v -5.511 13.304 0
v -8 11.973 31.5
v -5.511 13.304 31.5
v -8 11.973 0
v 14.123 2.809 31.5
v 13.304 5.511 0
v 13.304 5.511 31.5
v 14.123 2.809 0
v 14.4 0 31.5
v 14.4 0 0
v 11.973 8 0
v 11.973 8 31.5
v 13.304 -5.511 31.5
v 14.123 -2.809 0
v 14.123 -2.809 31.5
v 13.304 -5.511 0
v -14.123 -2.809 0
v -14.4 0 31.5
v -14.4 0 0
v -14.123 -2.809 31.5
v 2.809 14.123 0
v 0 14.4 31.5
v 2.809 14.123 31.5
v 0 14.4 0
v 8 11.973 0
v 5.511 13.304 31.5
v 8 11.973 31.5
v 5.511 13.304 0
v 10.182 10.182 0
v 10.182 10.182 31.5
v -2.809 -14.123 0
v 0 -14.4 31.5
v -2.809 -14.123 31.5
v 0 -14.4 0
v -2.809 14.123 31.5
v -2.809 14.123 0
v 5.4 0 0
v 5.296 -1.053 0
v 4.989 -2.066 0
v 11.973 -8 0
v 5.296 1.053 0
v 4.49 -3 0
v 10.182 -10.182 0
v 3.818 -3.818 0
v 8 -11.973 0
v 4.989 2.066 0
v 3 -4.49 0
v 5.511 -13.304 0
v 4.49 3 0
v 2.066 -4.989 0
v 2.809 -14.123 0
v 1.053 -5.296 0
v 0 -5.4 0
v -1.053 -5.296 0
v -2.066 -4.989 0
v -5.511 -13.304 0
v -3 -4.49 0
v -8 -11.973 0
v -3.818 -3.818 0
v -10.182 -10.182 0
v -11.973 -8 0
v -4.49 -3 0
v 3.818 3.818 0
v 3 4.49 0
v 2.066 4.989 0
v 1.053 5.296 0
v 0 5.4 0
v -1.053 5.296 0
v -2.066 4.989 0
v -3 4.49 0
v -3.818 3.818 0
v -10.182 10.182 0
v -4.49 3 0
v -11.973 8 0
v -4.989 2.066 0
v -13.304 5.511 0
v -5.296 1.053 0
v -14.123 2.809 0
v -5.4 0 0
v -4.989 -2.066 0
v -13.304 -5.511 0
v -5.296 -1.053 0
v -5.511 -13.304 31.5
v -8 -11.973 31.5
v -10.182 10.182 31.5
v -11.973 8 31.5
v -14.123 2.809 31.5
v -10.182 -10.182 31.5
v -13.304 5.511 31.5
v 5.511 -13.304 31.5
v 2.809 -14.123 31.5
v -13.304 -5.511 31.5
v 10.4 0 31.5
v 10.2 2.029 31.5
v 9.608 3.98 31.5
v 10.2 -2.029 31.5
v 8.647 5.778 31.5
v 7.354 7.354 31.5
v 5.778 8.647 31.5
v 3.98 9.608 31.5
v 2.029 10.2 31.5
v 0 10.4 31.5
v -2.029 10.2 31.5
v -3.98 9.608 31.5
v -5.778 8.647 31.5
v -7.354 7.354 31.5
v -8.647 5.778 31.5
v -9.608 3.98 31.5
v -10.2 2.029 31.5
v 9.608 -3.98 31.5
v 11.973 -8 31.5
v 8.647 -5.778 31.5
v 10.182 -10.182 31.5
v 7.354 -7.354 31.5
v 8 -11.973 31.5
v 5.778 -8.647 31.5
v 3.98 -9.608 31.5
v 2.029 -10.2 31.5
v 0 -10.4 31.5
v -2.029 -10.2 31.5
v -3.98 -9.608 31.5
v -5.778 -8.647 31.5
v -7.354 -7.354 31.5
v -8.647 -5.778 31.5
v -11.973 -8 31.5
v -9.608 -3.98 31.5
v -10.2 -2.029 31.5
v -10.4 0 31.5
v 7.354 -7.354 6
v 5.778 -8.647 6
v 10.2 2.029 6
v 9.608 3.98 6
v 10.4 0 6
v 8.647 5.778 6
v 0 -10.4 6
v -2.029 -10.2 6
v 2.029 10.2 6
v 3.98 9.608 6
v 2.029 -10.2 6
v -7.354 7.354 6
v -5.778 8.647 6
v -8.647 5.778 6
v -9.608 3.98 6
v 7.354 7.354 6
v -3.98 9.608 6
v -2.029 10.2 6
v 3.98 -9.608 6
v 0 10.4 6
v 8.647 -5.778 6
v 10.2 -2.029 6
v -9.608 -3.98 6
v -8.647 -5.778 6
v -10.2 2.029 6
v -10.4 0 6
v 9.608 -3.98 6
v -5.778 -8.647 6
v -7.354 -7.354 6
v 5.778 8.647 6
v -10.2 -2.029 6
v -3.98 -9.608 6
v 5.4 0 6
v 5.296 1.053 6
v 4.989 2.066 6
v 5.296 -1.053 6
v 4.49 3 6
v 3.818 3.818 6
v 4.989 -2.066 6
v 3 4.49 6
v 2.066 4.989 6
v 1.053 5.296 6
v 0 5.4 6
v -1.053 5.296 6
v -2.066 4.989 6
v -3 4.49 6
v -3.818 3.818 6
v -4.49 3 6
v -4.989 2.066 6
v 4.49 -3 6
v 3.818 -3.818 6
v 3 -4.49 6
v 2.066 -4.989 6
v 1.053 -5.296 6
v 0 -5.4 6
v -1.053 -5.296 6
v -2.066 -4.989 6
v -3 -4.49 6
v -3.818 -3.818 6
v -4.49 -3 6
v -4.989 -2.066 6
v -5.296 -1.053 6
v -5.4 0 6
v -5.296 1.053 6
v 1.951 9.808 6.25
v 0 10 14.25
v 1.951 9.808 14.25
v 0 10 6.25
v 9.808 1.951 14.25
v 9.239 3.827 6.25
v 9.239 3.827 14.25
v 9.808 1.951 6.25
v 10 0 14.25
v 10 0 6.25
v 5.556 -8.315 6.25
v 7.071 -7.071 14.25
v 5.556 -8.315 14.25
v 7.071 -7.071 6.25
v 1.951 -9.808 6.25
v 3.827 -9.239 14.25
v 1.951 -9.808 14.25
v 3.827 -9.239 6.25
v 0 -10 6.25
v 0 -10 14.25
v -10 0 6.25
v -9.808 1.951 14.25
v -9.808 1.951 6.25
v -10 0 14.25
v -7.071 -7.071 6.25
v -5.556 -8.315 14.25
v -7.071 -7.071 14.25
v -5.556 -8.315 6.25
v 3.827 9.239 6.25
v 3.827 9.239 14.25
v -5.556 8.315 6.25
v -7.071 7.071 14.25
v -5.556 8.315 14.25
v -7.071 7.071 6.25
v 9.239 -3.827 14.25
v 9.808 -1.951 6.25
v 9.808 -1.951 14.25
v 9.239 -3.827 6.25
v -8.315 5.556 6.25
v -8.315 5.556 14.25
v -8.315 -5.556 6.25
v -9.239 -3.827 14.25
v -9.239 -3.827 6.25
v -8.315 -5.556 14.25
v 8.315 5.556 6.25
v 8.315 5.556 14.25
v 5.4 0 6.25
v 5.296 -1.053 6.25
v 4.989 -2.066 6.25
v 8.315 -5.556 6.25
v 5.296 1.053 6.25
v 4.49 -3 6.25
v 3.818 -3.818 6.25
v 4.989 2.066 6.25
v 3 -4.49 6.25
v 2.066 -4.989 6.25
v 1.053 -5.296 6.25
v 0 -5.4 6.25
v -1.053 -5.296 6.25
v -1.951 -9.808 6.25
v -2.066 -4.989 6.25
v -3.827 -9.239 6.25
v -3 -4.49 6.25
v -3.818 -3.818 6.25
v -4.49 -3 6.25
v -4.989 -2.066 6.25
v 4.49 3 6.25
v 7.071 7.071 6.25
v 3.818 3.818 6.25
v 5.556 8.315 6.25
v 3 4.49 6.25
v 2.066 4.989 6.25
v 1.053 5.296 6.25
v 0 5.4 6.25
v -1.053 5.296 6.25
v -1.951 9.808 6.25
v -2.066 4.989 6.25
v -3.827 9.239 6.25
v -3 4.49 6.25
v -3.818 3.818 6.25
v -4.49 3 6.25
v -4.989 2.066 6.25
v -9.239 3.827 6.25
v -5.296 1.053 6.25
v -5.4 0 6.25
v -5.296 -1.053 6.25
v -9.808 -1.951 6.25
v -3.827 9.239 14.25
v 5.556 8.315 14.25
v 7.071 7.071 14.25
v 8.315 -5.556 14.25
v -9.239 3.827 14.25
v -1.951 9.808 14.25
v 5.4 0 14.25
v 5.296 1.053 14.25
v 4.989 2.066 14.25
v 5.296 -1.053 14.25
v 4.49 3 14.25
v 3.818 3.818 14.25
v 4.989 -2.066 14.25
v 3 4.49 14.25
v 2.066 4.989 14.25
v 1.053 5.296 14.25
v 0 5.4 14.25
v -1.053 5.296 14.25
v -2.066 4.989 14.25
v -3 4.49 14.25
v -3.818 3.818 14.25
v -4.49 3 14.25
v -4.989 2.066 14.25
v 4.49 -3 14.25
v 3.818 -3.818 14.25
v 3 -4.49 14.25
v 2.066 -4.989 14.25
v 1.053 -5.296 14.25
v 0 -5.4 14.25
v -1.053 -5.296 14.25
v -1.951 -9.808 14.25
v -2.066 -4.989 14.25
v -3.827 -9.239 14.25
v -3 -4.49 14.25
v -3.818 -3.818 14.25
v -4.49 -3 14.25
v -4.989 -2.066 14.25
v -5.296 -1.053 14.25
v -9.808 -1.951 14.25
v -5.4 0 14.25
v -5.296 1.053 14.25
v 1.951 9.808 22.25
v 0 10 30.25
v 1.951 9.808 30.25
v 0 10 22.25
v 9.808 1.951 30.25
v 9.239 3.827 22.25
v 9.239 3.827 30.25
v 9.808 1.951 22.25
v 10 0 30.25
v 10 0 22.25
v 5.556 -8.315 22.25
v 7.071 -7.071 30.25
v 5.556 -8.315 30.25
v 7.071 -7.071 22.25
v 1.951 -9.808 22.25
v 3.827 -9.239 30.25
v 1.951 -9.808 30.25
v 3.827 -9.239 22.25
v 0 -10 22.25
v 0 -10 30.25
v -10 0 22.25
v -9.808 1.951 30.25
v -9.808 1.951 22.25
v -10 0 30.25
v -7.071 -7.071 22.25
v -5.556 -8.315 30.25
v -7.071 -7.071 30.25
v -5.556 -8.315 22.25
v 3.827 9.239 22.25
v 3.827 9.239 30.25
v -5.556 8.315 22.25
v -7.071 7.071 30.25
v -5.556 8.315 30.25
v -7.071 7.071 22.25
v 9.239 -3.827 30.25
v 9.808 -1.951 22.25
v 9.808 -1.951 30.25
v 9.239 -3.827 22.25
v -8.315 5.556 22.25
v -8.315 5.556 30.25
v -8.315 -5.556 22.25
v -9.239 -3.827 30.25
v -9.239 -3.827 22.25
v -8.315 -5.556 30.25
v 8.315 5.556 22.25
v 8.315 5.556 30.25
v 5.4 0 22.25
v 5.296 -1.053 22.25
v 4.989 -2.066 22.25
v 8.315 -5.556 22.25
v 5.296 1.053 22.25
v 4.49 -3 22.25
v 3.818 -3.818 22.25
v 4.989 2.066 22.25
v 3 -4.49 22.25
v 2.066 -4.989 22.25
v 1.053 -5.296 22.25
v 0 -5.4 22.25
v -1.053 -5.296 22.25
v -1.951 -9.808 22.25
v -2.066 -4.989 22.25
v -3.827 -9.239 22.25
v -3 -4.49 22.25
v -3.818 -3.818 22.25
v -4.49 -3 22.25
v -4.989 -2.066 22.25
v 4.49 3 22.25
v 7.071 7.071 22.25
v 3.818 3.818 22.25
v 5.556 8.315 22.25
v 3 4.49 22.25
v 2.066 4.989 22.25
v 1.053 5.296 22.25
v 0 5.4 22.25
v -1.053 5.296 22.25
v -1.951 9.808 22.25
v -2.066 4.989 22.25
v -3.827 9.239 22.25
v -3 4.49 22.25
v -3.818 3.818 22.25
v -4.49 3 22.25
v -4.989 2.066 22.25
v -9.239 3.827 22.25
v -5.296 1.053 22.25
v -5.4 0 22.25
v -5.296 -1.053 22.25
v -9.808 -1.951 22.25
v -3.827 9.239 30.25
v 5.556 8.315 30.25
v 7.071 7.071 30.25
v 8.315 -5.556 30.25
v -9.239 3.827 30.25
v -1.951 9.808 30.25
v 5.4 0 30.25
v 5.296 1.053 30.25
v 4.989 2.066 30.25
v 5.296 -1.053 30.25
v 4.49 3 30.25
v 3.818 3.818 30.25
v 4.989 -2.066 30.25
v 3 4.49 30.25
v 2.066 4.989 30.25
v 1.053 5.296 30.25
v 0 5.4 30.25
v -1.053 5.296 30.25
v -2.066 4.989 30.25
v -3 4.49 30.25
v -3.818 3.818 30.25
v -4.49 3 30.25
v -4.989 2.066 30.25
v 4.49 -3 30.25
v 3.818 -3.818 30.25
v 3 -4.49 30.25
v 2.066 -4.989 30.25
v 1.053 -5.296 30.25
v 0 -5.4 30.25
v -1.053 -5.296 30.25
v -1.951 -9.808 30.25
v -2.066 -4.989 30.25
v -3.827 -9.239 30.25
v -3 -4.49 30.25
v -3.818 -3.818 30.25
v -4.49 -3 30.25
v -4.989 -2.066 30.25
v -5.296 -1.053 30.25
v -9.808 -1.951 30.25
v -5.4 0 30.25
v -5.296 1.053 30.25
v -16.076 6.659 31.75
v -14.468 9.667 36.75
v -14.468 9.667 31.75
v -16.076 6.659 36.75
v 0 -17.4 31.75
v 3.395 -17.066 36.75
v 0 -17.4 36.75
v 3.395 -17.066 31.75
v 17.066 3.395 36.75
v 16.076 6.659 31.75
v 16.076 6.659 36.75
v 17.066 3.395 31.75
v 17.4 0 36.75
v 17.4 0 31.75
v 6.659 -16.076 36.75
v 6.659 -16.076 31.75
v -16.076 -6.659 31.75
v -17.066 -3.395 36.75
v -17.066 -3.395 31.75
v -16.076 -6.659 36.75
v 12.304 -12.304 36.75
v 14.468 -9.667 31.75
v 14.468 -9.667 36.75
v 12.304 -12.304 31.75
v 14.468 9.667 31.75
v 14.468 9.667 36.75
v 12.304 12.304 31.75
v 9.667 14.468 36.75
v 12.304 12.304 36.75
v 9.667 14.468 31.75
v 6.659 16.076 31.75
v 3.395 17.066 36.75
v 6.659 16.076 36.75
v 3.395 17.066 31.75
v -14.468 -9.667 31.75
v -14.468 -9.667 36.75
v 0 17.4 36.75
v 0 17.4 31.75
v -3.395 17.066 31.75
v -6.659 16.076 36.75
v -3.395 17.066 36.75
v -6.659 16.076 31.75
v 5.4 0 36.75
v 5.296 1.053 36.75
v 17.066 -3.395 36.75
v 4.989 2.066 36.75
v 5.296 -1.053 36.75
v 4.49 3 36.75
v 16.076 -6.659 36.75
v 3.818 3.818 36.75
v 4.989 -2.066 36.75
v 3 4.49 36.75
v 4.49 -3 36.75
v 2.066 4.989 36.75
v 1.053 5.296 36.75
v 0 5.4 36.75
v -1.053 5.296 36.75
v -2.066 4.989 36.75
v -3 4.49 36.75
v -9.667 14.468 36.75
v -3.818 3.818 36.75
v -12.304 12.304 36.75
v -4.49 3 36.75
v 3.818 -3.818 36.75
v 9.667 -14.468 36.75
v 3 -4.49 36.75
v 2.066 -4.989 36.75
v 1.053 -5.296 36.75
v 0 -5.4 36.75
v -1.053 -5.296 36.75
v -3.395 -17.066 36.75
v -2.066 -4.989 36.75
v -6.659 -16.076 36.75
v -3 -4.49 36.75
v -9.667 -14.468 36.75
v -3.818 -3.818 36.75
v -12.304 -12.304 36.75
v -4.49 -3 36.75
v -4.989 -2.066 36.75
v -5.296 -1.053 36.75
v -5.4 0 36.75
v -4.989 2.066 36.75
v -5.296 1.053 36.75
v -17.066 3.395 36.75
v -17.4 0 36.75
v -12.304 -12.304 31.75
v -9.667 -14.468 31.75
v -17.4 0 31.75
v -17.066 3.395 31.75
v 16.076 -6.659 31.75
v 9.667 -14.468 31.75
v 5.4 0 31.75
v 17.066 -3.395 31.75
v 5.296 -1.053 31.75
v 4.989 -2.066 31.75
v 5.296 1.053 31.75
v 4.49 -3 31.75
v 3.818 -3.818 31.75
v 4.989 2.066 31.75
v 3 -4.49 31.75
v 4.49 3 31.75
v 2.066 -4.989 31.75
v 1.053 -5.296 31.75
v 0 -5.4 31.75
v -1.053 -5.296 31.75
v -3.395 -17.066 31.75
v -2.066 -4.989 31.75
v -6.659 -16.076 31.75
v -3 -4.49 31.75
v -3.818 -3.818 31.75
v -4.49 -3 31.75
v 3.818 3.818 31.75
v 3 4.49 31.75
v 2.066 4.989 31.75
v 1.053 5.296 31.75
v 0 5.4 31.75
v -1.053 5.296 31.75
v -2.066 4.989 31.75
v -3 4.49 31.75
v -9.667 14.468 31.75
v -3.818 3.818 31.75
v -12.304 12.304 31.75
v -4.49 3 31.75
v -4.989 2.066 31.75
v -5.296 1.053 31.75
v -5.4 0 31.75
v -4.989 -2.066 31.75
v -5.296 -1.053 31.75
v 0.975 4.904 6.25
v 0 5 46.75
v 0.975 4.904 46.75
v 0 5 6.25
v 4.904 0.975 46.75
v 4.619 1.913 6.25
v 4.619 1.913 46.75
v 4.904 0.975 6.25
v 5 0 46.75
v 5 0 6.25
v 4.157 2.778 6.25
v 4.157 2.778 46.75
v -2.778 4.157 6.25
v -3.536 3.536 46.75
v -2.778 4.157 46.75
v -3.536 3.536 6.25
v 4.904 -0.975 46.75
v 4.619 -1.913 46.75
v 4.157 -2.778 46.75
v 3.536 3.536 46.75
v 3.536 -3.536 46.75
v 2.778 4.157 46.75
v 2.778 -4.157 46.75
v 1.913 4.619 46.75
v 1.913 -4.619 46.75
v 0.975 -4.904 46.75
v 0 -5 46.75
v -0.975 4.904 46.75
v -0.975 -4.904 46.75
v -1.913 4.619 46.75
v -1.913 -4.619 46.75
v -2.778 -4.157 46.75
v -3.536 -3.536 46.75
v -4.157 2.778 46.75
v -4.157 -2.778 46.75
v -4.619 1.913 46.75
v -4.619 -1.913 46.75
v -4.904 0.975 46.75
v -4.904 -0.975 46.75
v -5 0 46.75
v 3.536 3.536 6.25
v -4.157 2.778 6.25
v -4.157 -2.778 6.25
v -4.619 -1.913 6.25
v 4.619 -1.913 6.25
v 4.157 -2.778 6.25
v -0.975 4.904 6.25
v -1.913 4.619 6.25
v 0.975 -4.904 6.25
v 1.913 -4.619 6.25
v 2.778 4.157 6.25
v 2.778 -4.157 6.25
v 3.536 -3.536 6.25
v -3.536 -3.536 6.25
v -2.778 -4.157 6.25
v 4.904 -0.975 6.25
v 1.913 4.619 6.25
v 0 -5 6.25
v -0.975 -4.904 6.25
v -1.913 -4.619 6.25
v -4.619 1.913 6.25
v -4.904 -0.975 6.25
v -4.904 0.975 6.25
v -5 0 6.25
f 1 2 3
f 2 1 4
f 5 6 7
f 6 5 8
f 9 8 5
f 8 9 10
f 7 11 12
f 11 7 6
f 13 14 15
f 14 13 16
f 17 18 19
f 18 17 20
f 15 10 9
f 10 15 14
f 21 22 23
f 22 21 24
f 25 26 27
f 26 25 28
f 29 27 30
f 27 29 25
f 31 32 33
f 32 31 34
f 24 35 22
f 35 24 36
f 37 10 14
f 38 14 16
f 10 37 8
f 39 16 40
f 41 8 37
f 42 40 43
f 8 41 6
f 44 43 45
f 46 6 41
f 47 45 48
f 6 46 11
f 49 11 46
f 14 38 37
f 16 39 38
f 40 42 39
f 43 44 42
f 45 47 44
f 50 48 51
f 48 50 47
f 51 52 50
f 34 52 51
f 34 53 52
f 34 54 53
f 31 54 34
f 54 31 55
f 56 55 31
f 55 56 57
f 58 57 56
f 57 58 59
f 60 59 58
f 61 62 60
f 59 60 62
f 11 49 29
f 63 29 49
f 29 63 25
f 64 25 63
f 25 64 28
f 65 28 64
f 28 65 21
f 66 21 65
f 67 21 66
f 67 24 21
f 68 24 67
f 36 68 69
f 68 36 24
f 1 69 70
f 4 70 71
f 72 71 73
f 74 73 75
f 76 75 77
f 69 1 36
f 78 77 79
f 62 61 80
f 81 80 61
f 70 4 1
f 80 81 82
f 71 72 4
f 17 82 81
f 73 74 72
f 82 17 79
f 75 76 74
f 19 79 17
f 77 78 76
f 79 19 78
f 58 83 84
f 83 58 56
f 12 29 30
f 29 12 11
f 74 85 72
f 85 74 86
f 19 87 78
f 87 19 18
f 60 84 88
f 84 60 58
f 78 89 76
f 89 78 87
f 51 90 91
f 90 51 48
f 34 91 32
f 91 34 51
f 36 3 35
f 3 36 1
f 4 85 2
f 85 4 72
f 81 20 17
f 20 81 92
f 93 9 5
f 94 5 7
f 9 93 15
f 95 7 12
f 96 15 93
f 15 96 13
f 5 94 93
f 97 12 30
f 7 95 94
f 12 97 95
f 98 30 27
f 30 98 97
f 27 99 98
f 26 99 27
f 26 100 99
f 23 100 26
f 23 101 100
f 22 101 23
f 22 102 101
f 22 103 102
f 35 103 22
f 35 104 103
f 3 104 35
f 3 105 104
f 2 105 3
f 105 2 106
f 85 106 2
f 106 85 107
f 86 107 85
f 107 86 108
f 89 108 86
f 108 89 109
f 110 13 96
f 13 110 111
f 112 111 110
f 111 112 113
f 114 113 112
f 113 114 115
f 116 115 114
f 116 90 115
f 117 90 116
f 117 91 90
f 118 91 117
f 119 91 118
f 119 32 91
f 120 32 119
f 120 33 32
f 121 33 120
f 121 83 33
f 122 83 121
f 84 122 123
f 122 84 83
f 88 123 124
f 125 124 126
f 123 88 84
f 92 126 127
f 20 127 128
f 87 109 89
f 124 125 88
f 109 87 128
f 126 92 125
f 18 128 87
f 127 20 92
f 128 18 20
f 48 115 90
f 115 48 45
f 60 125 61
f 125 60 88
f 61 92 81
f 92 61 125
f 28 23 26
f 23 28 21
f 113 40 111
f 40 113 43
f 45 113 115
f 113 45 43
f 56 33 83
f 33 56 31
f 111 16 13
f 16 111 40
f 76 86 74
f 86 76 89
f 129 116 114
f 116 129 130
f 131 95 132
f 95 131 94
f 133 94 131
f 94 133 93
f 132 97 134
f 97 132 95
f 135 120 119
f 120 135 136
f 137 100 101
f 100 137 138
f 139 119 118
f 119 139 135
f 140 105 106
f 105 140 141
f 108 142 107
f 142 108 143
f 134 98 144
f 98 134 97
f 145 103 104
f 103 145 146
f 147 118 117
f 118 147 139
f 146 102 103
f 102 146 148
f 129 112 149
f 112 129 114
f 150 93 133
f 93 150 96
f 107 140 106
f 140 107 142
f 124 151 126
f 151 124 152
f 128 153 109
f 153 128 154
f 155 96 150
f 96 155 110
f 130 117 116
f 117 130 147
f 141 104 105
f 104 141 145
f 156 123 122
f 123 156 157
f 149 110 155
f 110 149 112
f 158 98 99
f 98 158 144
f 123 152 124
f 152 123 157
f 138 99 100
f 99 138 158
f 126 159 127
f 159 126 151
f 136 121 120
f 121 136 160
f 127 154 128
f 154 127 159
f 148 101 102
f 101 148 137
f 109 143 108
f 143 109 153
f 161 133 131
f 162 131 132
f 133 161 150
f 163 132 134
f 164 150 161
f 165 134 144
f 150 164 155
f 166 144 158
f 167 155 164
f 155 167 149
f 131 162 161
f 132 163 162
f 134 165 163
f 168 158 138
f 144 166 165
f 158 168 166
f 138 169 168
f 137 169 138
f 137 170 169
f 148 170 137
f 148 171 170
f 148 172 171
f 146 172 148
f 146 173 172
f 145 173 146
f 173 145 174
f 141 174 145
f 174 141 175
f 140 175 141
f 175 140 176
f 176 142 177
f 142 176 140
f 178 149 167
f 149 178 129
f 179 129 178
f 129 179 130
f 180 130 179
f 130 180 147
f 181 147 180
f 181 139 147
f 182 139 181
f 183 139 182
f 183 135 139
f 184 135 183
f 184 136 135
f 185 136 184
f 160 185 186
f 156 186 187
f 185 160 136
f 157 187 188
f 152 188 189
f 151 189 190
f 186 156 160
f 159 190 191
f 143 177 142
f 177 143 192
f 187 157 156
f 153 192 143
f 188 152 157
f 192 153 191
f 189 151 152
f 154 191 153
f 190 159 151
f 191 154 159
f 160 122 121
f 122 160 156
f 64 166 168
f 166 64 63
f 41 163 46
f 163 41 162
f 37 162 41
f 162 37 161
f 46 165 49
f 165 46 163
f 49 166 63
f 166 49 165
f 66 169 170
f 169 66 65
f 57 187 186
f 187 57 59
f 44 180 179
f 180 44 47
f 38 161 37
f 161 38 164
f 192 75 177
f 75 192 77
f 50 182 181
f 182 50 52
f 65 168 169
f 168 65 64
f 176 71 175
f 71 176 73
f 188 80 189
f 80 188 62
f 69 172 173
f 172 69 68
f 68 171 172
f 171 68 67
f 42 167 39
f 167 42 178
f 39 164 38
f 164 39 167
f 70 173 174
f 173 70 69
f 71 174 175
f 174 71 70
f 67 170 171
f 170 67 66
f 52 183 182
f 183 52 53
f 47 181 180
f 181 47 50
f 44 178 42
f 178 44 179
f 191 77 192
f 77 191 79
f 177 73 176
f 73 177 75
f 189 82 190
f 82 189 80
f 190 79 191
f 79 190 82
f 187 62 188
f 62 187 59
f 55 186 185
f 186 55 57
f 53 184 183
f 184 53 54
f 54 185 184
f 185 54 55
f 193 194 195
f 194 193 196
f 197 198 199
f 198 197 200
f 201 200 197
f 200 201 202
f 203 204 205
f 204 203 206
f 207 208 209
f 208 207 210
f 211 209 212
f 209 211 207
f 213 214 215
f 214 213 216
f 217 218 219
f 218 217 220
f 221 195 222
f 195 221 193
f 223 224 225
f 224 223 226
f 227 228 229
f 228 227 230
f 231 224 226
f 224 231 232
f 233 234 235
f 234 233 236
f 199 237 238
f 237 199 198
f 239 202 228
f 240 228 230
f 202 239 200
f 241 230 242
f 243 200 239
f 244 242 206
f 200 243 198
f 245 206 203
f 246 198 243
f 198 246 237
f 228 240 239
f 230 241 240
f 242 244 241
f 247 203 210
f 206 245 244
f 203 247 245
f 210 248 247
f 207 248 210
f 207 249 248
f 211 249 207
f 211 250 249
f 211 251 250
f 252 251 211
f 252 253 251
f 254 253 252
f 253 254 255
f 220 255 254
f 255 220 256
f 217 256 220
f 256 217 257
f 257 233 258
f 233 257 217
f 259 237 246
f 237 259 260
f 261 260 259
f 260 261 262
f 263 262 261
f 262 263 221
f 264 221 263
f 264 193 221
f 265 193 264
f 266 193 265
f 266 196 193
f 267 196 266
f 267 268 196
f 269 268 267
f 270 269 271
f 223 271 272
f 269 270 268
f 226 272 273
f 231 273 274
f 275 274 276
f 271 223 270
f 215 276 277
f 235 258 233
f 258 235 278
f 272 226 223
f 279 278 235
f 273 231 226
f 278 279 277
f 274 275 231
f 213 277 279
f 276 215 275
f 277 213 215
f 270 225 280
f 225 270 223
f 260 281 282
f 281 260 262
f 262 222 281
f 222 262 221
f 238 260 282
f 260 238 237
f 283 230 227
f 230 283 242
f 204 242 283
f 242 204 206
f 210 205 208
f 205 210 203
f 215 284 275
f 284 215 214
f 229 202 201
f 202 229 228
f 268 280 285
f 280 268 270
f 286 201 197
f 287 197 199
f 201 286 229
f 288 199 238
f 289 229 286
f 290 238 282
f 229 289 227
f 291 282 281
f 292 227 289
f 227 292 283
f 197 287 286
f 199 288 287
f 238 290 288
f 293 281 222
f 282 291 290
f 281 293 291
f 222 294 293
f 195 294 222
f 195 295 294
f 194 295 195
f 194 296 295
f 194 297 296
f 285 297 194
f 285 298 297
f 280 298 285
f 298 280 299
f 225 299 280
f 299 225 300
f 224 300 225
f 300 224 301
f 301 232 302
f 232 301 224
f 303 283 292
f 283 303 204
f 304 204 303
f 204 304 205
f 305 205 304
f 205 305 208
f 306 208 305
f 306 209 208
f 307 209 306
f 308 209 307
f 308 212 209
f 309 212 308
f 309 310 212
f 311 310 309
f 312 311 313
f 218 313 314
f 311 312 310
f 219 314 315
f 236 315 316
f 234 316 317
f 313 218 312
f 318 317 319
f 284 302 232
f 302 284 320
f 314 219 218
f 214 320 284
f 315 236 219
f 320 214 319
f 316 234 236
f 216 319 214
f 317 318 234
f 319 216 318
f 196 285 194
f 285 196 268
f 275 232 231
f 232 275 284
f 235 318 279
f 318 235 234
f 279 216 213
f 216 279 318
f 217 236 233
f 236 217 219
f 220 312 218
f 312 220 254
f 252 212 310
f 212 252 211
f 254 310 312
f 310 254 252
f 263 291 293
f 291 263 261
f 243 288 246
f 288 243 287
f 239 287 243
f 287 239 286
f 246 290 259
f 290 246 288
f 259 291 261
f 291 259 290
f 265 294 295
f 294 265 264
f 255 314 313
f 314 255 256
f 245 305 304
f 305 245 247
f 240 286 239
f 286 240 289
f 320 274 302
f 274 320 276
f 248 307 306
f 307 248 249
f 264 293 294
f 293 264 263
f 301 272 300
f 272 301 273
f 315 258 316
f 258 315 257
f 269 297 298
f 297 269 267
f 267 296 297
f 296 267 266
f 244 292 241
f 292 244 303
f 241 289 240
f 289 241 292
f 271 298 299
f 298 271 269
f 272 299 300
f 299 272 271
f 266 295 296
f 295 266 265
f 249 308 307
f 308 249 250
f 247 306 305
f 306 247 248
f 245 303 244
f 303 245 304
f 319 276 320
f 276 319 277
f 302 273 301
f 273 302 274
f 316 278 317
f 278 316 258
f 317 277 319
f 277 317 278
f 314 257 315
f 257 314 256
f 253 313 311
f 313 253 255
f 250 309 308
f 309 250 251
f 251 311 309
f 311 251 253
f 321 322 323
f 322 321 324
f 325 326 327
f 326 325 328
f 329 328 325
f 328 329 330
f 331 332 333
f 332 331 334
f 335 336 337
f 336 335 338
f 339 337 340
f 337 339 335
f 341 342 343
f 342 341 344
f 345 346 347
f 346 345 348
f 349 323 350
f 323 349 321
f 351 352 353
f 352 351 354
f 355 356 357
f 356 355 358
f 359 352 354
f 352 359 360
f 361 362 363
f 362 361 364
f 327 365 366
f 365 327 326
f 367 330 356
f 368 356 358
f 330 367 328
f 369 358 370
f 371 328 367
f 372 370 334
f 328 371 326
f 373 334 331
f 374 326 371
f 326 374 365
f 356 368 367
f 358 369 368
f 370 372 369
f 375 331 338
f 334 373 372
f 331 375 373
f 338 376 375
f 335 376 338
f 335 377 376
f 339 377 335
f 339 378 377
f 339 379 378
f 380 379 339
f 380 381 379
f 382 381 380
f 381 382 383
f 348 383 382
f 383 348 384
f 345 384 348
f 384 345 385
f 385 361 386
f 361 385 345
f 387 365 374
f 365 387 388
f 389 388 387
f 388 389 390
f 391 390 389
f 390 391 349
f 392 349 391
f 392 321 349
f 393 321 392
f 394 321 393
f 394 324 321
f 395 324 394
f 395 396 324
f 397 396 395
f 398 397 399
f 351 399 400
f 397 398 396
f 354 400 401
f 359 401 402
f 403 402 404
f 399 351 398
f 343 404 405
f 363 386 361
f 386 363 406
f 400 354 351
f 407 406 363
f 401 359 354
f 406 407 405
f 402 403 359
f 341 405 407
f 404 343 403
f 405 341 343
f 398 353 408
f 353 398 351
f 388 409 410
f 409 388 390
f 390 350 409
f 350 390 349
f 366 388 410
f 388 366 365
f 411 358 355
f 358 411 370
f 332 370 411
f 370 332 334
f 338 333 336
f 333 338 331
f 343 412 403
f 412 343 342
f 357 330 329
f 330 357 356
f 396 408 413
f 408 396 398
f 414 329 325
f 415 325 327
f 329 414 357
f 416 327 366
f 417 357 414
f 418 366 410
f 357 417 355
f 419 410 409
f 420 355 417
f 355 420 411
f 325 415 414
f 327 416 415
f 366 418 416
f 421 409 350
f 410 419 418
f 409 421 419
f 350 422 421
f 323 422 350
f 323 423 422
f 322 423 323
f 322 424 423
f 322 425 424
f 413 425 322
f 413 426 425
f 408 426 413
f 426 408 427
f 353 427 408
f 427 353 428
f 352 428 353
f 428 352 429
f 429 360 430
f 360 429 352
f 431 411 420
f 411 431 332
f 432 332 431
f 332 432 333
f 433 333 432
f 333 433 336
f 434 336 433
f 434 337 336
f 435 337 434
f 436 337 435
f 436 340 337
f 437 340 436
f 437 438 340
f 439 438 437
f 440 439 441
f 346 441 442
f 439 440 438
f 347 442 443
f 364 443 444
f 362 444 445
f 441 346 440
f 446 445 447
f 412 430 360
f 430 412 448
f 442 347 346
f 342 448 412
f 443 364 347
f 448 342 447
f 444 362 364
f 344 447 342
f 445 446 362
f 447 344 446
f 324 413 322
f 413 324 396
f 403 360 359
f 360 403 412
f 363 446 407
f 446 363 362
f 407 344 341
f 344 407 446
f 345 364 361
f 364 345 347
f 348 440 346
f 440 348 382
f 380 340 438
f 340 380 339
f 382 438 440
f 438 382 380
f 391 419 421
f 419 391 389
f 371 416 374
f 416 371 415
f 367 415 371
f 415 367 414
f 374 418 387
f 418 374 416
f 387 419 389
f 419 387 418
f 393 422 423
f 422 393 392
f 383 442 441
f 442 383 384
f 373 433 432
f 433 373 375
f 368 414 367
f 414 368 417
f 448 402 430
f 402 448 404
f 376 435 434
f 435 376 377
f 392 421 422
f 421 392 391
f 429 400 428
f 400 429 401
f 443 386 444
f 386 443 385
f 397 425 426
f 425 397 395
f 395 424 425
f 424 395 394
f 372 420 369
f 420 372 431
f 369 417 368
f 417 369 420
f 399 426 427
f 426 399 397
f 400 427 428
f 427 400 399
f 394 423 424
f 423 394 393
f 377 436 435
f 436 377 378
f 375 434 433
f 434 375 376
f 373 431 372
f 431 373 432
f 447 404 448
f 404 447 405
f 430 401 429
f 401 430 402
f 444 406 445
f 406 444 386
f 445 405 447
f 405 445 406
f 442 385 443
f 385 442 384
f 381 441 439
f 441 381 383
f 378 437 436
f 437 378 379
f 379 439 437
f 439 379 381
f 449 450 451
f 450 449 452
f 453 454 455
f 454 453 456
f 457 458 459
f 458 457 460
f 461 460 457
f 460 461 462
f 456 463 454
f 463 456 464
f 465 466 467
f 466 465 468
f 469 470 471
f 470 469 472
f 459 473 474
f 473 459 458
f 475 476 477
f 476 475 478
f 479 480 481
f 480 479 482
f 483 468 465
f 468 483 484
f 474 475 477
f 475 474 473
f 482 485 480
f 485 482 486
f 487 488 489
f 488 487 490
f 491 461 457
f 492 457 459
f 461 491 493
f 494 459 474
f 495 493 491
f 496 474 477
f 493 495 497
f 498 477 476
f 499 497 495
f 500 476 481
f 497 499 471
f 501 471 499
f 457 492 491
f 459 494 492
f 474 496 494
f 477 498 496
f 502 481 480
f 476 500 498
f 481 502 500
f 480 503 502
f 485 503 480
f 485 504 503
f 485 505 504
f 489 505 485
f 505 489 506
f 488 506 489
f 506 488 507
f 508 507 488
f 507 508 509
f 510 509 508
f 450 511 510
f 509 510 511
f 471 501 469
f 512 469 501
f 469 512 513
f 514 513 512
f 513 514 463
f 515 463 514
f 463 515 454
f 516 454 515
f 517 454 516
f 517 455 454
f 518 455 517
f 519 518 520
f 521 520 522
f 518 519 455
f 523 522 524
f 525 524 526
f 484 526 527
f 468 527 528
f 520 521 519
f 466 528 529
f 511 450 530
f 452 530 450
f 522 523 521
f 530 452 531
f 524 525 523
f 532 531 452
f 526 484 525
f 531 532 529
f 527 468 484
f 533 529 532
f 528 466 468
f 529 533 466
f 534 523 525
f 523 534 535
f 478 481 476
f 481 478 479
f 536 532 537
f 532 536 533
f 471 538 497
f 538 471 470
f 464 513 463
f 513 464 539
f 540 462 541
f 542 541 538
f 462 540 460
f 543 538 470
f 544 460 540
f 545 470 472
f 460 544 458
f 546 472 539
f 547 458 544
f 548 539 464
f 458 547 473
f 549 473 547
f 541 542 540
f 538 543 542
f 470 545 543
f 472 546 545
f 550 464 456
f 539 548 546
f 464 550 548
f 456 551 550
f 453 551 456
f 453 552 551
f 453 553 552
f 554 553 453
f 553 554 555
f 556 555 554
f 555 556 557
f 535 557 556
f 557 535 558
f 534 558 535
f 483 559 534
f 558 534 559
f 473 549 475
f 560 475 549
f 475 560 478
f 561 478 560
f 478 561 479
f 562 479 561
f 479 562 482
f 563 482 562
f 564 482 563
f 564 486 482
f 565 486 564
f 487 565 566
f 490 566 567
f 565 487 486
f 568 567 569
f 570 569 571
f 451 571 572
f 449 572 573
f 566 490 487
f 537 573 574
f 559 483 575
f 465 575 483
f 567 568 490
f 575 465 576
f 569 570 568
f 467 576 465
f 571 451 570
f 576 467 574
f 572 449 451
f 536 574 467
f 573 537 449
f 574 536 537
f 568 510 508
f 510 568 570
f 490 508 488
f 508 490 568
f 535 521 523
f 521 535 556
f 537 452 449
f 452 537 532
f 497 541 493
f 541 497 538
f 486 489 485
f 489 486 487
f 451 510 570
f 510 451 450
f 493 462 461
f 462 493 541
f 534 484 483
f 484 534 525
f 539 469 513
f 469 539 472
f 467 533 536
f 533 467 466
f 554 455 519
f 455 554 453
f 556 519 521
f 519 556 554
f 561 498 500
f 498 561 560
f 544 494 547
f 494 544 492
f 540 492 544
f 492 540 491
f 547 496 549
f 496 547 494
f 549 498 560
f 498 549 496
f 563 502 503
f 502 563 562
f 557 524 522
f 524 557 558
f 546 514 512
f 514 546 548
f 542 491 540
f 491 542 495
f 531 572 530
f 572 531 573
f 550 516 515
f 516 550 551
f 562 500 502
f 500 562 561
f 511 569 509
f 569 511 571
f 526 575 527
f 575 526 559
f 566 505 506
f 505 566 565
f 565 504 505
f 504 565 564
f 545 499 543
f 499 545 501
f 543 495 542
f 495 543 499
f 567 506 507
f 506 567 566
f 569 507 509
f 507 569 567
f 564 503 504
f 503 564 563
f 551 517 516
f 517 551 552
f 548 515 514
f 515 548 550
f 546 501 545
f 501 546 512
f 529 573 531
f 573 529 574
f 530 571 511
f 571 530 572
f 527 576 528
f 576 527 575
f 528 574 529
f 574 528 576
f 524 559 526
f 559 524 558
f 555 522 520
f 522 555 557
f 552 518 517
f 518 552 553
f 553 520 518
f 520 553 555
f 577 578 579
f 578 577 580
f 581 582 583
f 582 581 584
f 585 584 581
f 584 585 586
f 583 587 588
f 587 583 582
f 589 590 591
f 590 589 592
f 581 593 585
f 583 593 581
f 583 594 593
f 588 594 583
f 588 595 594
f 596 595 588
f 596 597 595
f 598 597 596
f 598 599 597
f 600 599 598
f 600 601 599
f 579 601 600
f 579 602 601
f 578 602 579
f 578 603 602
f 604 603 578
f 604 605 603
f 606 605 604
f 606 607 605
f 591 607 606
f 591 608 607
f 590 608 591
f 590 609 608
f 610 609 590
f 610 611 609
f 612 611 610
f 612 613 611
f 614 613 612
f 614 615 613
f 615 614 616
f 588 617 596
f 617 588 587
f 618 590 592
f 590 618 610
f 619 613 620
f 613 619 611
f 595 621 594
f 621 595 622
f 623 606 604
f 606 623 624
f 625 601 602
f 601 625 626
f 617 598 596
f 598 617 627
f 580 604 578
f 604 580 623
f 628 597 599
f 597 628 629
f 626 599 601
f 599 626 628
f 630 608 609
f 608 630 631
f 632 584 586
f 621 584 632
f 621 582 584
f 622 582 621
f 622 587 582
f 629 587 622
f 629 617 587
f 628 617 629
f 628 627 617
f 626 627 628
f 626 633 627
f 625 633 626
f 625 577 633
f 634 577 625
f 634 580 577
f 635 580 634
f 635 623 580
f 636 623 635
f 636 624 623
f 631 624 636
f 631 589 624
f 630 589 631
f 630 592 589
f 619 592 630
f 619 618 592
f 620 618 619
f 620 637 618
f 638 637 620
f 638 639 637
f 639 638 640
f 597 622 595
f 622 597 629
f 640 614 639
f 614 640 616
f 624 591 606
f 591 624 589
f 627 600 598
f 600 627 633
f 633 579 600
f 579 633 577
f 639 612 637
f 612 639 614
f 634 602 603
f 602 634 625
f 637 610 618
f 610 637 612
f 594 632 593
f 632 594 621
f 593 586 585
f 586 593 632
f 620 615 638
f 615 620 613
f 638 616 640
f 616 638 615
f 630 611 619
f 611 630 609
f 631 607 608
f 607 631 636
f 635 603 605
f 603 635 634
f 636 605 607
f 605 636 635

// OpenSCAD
$fn = 32;

// ------------------------------------------------------------------------
// Shaft station: cup d28.8 x 31.5 mm, shaft d10
// Every part is its own module, assembly() places every instance.
// ------------------------------------------------------------------------

// --- part 1 ---
module housing_cup() {
  difference() {
    cylinder(h = 31.5, d = 28.8);
    translate([0, 0, 6]) cylinder(h = 26.5, d = 20.8);
    translate([0, 0, -1]) cylinder(h = 8, d = 10.8);
  }
}

// --- part 2 ---
module bearing_lower() {
  difference() {
      translate([0, 0, 0]) cylinder(h = 8, d = 20);
      translate([0, 0, -1]) cylinder(h = 10, d = 10.8);
    }
}

// --- part 3 ---
module bearing_upper() {
  difference() {
      translate([0, 0, 0]) cylinder(h = 8, d = 20);
      translate([0, 0, -1]) cylinder(h = 10, d = 10.8);
    }
}

// --- part 4 ---
module station_shaft() {
  translate([0, 0, -20.25]) cylinder(h = 40.5, d = 10);
}

// --- part 5 ---
module station_cover() {
  difference() {
    cylinder(h = 5, d = 34.8);
    translate([0, 0, -1]) cylinder(h = 7, d = 10.8);
  }
}

// --- assembly ---
module assembly() {
  color([0.80, 0.24, 0.20]) translate([0, 0, 0]) rotate([0, 0, 0]) housing_cup();
  color([0.20, 0.45, 0.75]) translate([0, 0, 6.25]) rotate([0, 0, 0]) bearing_lower();
  color([0.25, 0.62, 0.32]) translate([0, 0, 22.25]) rotate([0, 0, 0]) bearing_upper();
  color([0.92, 0.70, 0.18]) translate([0, 0, 26.5]) rotate([0, 0, 0]) station_shaft();
  color([0.58, 0.35, 0.70]) translate([0, 0, 31.75]) rotate([0, 0, 0]) station_cover();
}

assembly();
